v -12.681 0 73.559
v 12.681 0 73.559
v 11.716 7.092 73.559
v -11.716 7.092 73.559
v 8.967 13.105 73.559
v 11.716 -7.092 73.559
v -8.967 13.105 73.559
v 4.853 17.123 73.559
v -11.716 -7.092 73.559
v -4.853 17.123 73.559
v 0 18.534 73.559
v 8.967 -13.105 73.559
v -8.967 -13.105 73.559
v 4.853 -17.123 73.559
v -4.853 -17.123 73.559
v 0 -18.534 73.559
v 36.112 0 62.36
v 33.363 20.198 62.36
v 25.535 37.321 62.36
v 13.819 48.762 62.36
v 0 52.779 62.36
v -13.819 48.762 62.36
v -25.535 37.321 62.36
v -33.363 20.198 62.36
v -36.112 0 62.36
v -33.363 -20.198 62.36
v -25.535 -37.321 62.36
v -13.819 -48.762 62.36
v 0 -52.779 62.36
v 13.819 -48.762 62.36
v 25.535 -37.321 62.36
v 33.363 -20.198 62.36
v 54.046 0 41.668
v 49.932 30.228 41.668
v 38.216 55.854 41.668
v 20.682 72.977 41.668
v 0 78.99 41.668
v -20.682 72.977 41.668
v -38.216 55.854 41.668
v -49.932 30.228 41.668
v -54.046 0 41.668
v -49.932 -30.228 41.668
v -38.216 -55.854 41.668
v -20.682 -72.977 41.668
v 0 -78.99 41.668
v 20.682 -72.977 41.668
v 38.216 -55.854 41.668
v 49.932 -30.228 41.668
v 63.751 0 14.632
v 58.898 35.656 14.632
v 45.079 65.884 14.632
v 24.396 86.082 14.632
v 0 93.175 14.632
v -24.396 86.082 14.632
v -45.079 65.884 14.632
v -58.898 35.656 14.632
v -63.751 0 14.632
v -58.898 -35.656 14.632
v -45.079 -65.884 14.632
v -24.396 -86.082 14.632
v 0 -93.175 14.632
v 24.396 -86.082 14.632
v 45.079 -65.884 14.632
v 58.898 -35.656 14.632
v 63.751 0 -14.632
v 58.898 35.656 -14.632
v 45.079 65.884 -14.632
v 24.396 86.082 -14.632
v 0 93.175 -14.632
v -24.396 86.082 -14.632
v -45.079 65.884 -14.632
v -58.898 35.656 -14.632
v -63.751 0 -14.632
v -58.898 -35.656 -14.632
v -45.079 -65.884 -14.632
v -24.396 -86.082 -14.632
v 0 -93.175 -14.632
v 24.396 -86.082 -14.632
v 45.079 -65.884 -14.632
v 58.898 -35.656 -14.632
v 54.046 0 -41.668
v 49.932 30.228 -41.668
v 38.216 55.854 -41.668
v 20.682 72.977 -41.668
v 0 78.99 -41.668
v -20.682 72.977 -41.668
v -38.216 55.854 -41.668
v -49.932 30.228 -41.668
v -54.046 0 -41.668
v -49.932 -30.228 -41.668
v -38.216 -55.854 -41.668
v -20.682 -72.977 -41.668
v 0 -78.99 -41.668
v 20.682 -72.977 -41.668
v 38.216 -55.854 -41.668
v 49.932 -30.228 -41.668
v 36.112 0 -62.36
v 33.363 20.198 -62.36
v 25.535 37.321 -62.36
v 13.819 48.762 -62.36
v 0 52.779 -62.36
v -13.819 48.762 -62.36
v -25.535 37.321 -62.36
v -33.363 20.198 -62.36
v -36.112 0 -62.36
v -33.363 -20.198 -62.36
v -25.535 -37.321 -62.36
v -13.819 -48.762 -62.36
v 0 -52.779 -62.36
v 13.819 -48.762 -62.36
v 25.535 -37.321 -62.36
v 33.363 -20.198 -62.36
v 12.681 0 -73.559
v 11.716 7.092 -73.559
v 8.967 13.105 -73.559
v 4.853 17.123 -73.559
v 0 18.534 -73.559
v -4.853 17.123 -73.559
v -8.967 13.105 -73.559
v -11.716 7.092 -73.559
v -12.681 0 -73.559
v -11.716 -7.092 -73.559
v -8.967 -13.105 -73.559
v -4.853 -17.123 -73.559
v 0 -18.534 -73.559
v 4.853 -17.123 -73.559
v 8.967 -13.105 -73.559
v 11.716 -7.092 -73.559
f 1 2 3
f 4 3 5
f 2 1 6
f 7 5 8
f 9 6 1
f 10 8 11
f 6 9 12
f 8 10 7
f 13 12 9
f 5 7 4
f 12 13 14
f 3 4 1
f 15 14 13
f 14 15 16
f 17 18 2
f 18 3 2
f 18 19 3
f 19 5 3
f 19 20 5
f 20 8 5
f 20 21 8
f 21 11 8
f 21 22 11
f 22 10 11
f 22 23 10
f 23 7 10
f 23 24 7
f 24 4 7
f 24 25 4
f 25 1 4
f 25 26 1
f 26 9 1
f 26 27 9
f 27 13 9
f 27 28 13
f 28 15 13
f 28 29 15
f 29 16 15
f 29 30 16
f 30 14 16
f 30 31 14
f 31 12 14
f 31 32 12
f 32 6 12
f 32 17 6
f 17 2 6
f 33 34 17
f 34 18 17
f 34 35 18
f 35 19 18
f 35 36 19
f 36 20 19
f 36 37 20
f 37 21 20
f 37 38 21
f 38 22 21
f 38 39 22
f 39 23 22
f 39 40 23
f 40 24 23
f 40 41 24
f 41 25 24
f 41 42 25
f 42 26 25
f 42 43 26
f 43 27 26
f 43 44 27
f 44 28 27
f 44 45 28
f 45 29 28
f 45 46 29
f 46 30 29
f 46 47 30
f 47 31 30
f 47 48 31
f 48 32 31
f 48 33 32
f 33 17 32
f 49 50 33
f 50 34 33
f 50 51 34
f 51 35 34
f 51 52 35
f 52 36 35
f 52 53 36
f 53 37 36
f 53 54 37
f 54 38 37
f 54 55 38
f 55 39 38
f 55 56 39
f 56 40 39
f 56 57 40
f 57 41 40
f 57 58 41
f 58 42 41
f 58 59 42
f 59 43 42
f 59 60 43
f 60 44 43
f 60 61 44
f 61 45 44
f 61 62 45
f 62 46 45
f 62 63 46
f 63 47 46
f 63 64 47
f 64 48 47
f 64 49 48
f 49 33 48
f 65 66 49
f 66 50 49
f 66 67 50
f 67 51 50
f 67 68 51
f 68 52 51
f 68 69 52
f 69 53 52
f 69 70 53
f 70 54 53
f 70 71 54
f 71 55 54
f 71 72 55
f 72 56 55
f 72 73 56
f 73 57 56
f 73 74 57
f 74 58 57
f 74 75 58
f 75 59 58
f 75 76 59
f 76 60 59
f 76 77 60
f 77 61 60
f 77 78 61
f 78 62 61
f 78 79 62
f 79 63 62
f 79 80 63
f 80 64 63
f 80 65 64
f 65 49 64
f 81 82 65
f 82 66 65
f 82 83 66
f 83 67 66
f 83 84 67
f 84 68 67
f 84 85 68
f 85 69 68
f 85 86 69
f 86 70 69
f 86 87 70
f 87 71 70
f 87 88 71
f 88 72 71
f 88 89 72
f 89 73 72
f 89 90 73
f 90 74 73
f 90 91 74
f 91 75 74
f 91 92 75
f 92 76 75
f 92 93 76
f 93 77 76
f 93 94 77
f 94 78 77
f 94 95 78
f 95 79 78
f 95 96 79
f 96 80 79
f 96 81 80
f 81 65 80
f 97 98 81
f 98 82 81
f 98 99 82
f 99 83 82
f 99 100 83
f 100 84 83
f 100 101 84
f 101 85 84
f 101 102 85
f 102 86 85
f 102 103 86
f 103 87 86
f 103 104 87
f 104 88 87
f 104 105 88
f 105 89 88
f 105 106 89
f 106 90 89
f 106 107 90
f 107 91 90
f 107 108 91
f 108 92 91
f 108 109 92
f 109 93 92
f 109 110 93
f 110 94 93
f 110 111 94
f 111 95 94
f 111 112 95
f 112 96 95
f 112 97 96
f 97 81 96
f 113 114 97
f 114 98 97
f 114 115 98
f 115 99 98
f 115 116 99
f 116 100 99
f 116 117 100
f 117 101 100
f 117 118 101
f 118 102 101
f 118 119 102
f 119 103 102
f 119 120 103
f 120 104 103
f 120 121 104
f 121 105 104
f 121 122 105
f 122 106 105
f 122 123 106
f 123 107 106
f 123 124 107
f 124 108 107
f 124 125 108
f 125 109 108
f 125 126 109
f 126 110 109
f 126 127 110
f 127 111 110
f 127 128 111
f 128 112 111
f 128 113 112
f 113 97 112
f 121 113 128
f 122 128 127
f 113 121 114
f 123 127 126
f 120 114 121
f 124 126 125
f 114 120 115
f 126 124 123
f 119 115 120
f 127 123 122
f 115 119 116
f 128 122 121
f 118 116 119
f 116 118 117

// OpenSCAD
// Generated by SolidPython 1.0.1 on 2020-07-29 00:46:51


scale(v = [13, 19, 15]) {
	sphere(r = 5);
}
/***********************************************
*********      SolidPython code:      **********
************************************************
 
# import packages: SolidPython
from solid import *
from solid.utils import *
from itertools import chain, combinations, permutations


class Resize:

    def __init__(self, scad_file):
        self.scad_file = scad_file
        #self.scad_file = import_scad(scad_file)
        # cone/cylinder param:
        self.r1 = 0
        self.r2 = 0
        self.h = 0
        # rectangular prism param:
        self.w = 0
        self.l = 0
        # ellipse param:
        self.r = 0

    # import OpenScad code (file name corresponds to shape)


    # classify shape + parameters
    def assign(self, param1, param2, param3):
        if self.scad_file == 'cone.scad':
            self.r1 = param1
            self.r2 = param2
            self.h = param3
        elif self.scad_file == 'cylinder.scad':
            self.r1 = param1
            self.r2 = param2
            self.h = param3
        elif self.scad_file == 'rectangularPrism.scad':
            self.h = param1
            self.l = param2
            self.w = param3
        else:
            self.r = param1
            self.h = param2

    # resize parameters
    def iterate(self):
        x = range(3, 20, 2)
        i = 1
        if self.scad_file == 'cone.scad':
            tempList = list(permutations(x, 2))
            for temp in tempList:
                param1 = temp[0]
                param2 = temp[1]
                filepath = 'produced_scad_files/' + 'cone' + str(param1) + '_' + str(param2) + '_' + '.scad'
                scad_render_to_file(cylinder(h=param1, r1=param2, r2=0), filepath)

        elif self.scad_file == 'cylinder.scad':
            tempList = list(permutations(x, 3))
            for temp in tempList:
                param1 = temp[0]
                param2 = temp[1]
                filepath = 'produced_scad_files/' + 'cylinder' + str(param1) + '_' + str(param2) + '_' + '.scad'
                scad_render_to_file(cylinder(h=param1, r1=param2, r2=param2), filepath)

        elif self.scad_file == 'rectangularPrism.scad':
            tempList = list(permutations(x, 3))
            for temp in tempList:
                param1 = temp[0]
                param2 = temp[1]
                param3 = temp[2]
                filepath = 'produced_scad_files/' + 'rectangularPrism' + str(param1) + '_' + str(param2) + '_' + str(
                    param3) + '.scad'
                scad_render_to_file(cube(size=(param1, param2, param3)), filepath)

        elif self.scad_file == 'ellipse.scad':
            tempList = list(permutations(x, 4))
            for temp in tempList:
                param1 = temp[0]
                param2 = temp[1]
                param3 = temp[2]
                param4 = temp[3]
                filepath = 'produced_scad_files/' + 'ellipse' + str(param1) + '_' + str(param2) + '_' + str(param3) + '_' + str(param4) + '.scad'
                scad_render_to_file(scale([param1, param2, param3])(sphere(r=param4)), filepath)

    def render_to_scadfile(self):
        scad_render_to_file(scad, 'example.scad') 
 
************************************************/
